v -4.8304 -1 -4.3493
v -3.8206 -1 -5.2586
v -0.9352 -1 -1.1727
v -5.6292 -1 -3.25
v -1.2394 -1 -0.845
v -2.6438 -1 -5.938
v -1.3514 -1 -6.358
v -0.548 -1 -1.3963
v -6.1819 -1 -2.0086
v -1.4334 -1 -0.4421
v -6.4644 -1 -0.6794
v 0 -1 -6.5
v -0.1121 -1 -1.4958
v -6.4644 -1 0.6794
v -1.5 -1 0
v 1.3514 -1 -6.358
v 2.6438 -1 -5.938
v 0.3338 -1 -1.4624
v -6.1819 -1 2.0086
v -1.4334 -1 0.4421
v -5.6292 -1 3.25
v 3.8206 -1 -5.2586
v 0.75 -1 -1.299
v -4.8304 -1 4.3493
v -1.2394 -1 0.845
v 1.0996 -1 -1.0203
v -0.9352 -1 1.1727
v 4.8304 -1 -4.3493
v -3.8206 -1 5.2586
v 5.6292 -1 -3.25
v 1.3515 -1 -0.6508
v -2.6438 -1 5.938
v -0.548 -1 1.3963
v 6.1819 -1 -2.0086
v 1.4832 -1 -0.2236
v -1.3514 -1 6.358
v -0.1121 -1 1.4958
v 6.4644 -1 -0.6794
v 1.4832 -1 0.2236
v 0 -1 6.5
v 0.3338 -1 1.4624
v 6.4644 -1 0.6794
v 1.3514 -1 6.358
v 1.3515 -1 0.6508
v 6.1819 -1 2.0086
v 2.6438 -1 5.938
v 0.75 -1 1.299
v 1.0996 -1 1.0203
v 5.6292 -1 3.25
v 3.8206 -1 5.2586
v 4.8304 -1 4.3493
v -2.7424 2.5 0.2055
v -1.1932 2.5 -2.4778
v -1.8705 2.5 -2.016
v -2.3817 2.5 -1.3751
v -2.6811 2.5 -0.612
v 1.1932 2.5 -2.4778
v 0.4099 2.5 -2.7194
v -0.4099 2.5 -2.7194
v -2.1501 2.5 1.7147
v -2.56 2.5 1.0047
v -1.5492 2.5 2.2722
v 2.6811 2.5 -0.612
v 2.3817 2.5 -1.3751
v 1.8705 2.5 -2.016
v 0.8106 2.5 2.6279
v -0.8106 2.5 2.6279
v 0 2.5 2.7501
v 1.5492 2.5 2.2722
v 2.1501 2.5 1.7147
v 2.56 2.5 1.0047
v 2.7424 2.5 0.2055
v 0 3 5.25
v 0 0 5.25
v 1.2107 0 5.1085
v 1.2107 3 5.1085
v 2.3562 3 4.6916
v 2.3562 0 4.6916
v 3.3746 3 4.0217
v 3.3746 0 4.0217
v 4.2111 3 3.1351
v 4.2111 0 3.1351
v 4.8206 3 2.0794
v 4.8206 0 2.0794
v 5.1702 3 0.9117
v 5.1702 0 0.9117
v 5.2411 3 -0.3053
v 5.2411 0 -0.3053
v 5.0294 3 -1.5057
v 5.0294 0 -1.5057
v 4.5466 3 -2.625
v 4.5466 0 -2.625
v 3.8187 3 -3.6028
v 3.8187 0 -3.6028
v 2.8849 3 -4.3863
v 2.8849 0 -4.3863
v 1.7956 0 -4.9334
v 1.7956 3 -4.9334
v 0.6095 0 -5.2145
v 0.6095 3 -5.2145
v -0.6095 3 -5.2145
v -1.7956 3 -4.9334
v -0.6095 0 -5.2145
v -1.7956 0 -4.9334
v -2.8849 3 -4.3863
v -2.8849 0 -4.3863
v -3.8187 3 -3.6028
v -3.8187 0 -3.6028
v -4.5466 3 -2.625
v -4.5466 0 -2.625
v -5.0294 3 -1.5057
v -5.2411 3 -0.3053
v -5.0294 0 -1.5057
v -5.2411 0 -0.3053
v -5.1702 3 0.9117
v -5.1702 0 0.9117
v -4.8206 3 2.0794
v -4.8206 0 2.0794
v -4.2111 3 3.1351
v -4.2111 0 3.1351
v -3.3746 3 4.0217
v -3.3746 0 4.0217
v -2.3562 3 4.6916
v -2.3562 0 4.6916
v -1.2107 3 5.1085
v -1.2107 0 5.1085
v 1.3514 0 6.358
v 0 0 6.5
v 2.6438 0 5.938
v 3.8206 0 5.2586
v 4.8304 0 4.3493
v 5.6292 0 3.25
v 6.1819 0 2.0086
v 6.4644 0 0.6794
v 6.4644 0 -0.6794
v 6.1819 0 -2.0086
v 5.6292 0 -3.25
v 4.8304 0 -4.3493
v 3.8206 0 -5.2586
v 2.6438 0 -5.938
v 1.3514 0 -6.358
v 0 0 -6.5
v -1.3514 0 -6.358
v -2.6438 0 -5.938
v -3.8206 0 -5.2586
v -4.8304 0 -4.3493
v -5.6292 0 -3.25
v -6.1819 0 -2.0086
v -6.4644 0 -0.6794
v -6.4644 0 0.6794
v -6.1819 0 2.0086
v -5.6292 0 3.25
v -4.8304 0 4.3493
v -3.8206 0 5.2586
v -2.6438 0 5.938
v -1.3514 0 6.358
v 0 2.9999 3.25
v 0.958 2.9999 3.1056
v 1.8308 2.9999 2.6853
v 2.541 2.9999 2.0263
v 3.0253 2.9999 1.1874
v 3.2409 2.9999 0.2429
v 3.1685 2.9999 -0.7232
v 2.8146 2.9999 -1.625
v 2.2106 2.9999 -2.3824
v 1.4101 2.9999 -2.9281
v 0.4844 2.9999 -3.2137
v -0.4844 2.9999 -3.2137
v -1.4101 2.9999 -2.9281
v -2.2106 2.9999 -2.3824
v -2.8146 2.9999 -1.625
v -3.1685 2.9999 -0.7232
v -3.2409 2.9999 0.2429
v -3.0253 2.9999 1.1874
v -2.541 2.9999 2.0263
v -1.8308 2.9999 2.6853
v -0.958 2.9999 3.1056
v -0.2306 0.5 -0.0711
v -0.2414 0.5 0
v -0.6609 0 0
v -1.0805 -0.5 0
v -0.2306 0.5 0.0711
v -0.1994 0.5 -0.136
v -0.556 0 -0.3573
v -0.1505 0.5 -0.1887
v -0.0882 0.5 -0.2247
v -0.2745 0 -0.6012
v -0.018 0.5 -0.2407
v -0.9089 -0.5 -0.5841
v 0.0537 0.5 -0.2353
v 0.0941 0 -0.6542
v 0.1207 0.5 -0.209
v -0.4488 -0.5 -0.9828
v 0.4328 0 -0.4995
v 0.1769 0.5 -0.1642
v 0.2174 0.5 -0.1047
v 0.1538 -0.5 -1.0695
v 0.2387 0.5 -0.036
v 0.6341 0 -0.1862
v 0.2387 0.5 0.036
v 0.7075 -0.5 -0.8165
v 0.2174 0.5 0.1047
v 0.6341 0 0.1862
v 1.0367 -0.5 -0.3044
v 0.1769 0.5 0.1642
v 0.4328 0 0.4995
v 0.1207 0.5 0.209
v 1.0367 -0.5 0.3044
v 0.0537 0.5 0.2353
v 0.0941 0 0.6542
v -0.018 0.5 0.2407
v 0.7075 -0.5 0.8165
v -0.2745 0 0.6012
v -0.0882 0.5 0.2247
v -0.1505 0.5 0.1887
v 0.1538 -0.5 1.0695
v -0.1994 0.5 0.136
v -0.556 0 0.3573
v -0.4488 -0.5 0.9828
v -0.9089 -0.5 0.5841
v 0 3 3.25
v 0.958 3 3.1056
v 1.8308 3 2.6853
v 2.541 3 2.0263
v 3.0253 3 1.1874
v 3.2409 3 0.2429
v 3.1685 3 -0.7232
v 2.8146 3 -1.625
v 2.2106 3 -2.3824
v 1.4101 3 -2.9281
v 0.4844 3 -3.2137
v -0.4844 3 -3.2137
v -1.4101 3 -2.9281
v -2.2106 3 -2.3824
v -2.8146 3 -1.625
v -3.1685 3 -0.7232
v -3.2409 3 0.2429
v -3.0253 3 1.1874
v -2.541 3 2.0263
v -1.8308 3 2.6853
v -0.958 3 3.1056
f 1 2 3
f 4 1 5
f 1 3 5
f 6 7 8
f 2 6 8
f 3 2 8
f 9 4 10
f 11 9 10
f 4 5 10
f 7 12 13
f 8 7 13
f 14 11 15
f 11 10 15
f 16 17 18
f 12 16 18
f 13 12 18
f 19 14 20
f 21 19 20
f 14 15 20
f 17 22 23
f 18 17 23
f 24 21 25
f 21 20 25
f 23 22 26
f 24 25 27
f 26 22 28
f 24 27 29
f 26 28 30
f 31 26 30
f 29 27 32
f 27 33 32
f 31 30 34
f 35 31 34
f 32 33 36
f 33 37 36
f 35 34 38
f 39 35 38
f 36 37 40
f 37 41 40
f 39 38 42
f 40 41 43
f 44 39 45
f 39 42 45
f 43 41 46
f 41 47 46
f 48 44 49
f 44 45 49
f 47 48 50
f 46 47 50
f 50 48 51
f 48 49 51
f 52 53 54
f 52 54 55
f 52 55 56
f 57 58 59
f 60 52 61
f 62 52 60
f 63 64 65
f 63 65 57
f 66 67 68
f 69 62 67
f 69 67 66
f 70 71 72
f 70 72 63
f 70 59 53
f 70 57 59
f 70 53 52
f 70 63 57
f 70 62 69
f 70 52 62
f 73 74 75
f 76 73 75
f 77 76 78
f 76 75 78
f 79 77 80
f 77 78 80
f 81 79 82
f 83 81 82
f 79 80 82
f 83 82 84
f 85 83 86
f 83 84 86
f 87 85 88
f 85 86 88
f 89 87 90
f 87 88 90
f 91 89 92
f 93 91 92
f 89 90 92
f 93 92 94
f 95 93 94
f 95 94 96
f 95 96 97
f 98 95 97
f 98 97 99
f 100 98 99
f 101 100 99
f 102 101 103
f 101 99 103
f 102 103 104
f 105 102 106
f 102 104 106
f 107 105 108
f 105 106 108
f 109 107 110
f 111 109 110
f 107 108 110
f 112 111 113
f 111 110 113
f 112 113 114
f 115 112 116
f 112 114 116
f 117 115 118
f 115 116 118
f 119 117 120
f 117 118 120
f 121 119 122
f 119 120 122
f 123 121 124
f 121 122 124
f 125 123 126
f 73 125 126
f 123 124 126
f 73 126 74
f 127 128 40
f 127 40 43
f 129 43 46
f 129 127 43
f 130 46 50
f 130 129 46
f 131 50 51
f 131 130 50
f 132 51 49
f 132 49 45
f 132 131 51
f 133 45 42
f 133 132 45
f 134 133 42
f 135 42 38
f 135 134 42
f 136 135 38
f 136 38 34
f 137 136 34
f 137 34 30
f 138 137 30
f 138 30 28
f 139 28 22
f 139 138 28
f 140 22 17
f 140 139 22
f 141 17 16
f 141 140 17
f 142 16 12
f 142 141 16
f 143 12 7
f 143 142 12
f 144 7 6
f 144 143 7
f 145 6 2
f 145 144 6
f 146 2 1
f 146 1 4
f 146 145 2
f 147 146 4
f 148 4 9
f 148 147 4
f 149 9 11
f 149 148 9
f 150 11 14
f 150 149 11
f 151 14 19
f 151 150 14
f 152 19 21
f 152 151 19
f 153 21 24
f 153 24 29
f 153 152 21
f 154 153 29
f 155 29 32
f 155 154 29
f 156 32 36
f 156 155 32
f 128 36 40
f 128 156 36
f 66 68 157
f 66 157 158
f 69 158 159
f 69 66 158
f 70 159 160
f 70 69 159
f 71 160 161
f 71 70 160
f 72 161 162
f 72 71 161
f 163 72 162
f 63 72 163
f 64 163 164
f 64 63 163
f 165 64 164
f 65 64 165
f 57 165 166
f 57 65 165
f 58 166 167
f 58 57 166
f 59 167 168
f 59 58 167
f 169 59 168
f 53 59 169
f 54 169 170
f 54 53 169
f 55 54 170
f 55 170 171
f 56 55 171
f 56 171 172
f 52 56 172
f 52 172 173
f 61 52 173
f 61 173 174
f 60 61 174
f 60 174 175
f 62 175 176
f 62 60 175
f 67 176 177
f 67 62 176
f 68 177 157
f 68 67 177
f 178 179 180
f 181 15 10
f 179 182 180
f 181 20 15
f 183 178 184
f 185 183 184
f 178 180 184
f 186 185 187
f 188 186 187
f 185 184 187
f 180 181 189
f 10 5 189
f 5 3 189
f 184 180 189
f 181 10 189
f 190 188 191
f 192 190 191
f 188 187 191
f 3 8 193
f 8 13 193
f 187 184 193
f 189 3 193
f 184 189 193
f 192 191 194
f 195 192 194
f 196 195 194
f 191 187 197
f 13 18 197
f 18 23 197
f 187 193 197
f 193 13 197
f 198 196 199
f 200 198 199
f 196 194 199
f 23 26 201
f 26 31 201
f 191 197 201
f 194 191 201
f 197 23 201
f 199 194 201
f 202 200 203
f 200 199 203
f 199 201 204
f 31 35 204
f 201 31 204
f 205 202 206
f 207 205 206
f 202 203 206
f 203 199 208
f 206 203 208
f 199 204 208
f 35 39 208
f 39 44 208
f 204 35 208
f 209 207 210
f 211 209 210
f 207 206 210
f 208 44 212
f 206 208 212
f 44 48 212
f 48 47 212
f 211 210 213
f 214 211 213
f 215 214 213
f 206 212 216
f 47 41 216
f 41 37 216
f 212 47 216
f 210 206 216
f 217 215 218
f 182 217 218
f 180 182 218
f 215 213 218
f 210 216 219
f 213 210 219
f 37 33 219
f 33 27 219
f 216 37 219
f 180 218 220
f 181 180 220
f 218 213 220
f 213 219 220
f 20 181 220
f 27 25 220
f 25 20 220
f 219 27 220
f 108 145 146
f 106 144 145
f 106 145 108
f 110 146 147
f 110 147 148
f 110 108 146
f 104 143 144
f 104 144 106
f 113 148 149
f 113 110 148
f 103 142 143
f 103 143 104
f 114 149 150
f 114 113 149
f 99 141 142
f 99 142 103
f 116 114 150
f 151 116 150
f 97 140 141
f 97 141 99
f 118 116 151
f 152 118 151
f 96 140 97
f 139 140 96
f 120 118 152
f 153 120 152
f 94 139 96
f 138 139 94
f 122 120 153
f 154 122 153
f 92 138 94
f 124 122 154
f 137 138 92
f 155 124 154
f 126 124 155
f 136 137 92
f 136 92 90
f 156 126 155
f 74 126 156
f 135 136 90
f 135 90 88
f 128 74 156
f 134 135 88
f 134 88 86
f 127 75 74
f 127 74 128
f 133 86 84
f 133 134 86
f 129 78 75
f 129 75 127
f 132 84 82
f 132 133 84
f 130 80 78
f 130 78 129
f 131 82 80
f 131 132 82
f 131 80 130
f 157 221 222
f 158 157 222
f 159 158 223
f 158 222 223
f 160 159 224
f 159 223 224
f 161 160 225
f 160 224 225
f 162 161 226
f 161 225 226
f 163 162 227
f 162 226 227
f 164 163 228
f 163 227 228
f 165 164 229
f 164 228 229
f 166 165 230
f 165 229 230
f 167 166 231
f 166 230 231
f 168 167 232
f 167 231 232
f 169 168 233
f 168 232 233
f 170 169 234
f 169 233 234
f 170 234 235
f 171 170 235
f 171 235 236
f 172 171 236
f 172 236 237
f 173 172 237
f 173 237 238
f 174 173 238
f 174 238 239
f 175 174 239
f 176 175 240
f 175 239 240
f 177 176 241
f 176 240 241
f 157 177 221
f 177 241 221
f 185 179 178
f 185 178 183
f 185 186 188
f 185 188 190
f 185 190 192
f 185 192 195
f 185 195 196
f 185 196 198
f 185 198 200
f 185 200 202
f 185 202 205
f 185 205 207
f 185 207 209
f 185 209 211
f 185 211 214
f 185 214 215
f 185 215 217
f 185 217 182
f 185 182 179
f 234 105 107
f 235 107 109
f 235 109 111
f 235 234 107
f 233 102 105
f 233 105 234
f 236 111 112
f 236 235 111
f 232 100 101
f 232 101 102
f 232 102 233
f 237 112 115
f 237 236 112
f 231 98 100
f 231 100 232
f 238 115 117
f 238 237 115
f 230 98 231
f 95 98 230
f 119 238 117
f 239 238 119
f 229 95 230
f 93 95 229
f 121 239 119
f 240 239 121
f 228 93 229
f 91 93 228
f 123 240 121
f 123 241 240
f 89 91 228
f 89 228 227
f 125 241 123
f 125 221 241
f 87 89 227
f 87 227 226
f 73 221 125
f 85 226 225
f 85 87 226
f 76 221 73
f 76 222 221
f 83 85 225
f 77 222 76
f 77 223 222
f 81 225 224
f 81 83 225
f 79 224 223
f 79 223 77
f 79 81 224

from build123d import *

# Parameters (mm, degrees)
BASES_R             = 6.5
BASE_DEPTH          = 1
O_RINGCAPTURES_R    = 5.25
O_RINGCAPTURE_DEPTH = 3
TOPBORES_R          = 3.25
TOPBORE_DEPTH       = 0.5
CHAMFER1_SIZE       = 0.5
CYLINDERBORES_R     = 1.5
CUT_EXTRUDE1_DEPTH  = 1.5
CUT_EXTRUDE1_DRAFT  = -40


with BuildPart() as part:
    # BaseS → Base (new body)
    with BuildSketch(Plane(origin=(0, 0, 0), x_dir=(1, 0, 0), z_dir=(0, 1, 0))):
        with Locations(Location((0, 0, 0), (0, 0, 270))):
            Circle(BASES_R)
    extrude(amount=-BASE_DEPTH)

    # O-RingCaptureS → O-RingCapture (add)
    with BuildSketch(Plane(origin=(0, 0, 0), x_dir=(1, 0, 0), z_dir=(0, 1, 0))):
        with Locations(Location((0, 0, 0), (0, 0, 270))):
            Circle(O_RINGCAPTURES_R)
    extrude(amount=O_RINGCAPTURE_DEPTH)

    # TopBoreS → TopBore (cut)
    with BuildSketch(Plane(origin=(0, 3, 0), x_dir=(1, 0, 0), z_dir=(0, 1, 0))):
        with Locations(Location((0, 0, 0), (0, 0, 270))):
            Circle(TOPBORES_R)
    extrude(amount=-TOPBORE_DEPTH, mode=Mode.SUBTRACT)

    # Chamfer1
    chamfer1_edges = [part.edges().sort_by_distance(p)[0] for p in [
        (0, 2.5, -3.25),
    ]]
    chamfer(chamfer1_edges, length=CHAMFER1_SIZE - 0.0001)  # a hair under: the kernel refuses the full size


with BuildPart() as cut_extrude1_tool:
    # CylinderBoreS → Cut-Extrude1 (with draft: the straight prism first)
    with BuildSketch(Plane(origin=(0, -1, 0), x_dir=(-1, 0, 0), z_dir=(0, -1, 0))):
        Circle(CYLINDERBORES_R)
    extrude(amount=-CUT_EXTRUDE1_DEPTH)
    # Cut-Extrude1: the draft: its side faces are tilted about the plane it starts from
    cut_extrude1_sides = [cut_extrude1_tool.faces().sort_by_distance(p)[0] for p in [
        (1.5, -0.25, 0),
    ]]
    draft(cut_extrude1_sides, Plane(origin=(0, -1, 0), x_dir=(-1, 0, 0), z_dir=(0, -1, 0)), CUT_EXTRUDE1_DRAFT)


with BuildPart() as part_1:
    add(part.part)

    # Cut-Extrude1: cut by cut_extrude1_tool
    add(cut_extrude1_tool.part, mode=Mode.SUBTRACT)


solid = part_1.part
